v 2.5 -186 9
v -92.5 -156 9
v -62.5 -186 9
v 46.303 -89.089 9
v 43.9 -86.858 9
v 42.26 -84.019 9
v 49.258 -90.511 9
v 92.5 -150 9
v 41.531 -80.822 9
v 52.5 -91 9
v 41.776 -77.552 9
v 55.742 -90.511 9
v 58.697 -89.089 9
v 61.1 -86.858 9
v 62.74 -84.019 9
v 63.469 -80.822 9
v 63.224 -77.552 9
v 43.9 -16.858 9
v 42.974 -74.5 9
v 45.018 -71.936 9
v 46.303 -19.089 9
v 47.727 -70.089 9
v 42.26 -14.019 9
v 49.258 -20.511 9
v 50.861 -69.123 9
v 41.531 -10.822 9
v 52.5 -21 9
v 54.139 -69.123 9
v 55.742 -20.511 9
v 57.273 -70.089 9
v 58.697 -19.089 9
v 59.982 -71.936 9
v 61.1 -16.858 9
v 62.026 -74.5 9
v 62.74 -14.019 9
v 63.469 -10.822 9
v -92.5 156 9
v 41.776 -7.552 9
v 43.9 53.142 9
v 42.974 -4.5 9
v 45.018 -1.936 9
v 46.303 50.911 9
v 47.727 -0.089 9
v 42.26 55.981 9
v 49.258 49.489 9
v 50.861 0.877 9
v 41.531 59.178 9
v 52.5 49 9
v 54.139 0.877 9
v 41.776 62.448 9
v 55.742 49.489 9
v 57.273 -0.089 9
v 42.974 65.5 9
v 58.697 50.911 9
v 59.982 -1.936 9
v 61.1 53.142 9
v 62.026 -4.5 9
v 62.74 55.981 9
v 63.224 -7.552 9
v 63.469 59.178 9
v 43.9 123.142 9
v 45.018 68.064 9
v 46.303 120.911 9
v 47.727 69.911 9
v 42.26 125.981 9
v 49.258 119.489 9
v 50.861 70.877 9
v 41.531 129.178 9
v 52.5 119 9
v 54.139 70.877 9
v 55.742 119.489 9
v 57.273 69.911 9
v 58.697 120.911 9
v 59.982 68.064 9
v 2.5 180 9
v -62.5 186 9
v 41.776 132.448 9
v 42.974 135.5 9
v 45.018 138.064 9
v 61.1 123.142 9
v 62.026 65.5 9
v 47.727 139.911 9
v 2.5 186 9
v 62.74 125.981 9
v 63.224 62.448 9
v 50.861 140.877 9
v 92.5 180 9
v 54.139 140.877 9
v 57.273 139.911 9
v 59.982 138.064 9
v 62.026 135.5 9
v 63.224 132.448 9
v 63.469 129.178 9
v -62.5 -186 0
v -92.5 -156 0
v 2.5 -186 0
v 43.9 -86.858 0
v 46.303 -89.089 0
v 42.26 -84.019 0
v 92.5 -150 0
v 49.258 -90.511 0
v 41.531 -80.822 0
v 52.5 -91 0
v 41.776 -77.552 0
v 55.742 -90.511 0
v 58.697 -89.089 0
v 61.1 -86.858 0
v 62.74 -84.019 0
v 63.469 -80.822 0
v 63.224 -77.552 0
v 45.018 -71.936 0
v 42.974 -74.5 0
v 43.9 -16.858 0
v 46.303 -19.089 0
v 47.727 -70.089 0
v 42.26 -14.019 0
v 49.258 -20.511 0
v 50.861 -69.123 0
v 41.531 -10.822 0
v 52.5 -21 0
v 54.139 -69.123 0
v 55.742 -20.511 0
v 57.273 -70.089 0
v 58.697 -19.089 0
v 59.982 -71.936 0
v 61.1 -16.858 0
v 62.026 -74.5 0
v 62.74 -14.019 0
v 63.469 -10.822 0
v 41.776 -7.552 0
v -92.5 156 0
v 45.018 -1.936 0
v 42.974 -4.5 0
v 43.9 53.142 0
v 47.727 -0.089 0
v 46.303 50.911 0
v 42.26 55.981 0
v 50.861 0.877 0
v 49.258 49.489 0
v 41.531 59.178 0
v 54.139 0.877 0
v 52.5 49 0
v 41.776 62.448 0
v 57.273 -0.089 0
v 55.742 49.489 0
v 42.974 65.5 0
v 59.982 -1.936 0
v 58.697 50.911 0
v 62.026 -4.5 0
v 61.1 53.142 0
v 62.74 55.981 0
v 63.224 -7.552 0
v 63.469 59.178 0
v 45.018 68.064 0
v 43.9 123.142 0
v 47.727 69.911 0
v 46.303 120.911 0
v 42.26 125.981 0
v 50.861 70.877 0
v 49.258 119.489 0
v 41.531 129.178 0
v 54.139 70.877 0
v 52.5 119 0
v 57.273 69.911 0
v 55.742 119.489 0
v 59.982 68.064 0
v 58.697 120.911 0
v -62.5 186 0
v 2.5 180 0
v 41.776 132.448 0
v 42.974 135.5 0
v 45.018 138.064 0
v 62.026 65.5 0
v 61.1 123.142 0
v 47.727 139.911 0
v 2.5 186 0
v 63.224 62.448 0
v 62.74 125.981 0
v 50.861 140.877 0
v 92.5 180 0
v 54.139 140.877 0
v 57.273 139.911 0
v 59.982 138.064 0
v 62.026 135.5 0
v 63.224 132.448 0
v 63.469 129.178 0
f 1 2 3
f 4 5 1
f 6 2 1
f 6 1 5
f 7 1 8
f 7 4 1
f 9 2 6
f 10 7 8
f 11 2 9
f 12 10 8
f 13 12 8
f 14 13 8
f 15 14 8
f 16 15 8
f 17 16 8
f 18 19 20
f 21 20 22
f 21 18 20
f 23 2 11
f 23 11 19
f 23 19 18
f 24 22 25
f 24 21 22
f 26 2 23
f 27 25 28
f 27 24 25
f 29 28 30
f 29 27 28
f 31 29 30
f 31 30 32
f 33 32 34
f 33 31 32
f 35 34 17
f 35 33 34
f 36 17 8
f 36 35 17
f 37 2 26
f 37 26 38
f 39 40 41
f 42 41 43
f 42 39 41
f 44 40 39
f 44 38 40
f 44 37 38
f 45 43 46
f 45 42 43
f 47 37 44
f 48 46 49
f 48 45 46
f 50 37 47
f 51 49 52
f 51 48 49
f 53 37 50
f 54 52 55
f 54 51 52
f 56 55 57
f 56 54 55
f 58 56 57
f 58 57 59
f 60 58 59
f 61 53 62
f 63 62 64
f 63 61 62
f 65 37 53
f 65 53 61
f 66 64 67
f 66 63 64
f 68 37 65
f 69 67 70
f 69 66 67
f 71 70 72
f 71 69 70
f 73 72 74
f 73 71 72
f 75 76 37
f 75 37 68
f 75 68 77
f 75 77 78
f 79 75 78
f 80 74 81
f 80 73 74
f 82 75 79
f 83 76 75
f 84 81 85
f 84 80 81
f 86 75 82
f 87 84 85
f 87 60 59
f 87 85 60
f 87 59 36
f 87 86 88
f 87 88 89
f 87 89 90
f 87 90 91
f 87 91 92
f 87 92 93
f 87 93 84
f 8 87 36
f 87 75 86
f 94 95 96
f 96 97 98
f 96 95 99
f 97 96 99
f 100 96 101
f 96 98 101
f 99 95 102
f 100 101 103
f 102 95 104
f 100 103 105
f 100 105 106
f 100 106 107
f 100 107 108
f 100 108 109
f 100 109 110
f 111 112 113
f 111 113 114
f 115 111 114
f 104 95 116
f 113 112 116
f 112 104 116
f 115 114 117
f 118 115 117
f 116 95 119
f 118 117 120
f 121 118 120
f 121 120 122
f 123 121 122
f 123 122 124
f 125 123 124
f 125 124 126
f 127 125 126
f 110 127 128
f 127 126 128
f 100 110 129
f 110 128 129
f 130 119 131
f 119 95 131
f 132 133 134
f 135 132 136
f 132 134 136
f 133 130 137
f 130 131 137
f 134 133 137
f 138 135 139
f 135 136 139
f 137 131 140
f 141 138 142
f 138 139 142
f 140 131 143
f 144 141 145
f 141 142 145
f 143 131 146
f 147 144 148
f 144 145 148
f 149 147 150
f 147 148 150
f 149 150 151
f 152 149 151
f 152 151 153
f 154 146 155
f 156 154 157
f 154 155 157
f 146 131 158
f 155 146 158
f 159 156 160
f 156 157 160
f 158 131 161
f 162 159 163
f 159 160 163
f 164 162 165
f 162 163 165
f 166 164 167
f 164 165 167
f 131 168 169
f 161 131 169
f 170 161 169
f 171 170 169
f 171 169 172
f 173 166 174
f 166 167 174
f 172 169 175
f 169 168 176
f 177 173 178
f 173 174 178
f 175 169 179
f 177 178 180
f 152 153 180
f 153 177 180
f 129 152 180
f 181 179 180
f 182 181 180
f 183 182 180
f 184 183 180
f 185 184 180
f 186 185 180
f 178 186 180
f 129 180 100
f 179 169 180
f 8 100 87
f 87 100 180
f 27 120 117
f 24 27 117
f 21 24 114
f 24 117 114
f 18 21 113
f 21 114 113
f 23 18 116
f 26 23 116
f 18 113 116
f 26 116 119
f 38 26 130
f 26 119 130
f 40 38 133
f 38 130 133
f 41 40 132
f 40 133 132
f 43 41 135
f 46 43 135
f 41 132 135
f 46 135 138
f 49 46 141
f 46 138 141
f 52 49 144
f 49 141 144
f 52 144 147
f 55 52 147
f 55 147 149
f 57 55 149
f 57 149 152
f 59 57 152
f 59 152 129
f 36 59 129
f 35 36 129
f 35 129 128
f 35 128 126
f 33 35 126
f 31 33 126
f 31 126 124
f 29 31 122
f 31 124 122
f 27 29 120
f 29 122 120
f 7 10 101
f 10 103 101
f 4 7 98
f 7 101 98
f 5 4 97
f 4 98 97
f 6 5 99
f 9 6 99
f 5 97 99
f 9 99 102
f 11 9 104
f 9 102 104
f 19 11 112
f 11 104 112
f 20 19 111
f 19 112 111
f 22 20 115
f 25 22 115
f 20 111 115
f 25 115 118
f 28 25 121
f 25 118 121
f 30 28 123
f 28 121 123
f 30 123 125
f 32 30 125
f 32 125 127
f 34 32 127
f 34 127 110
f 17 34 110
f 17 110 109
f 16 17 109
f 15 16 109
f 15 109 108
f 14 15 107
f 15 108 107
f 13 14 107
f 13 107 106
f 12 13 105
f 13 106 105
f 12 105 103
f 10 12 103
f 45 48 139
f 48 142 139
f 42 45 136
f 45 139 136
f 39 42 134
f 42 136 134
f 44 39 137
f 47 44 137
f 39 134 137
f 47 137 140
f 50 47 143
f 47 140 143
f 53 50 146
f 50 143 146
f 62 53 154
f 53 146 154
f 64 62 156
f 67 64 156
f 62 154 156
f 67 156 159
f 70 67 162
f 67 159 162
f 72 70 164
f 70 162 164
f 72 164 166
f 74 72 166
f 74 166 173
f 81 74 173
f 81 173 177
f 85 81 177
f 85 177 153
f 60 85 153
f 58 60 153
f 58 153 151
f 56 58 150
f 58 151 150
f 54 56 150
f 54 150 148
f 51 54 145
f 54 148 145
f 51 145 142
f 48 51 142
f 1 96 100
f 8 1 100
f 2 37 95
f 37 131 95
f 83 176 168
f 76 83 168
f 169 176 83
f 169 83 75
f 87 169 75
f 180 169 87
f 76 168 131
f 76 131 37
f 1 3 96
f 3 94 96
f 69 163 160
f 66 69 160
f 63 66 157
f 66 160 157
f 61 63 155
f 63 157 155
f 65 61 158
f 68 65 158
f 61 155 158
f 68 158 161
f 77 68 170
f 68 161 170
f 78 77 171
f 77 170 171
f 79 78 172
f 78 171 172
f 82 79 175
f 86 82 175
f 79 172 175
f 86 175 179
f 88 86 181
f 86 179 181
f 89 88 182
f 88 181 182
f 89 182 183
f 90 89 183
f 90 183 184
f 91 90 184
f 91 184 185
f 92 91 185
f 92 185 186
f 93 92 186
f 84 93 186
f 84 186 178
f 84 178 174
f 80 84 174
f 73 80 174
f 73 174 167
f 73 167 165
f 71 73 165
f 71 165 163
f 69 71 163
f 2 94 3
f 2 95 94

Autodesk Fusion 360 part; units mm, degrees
sketch "スケッチ1" plane through (0, 0, 0) normal (0, 0, 1) x (1, 0, 0)
  line L0 (2.5, 186) -> (-92.5, 186)
  line L1 (-92.5, 186) -> (-92.5, -186)
  line L2 (-92.5, -186) -> (2.5, -186)
  line L3 (92.5, -150) -> (92.5, 180)
  line L4 (89.5161, 180) -> (-92.5, -186) construction
  line L5 (-92.5, 186) -> (77.5673, -155.9731) construction
  line L6 (2.5, 186) -> (2.5, 180)
  line L7 (2.5, 180) -> (92.5, 180)
  line L8 (-92.5, -186) -> (2.5, -186) construction
  line L9 (2.5, -186) -> (92.5, -150)
  dimension "d2" = 372
  dimension "d5" = 95
extrude "押し出し1" add sketch "スケッチ1" along normal blind 9
chamfer "面取り1" distance 30 angle 45 2 edges at (-92.5, -186, 4.5) (-92.5, 186, 4.5)
sketch "スケッチ2" plane through (0, 0, 9) normal (0, 0, 1) x (-1, 0, 0)
  line L0 (62.5, -186) -> (92.5, -156)
  line L1 (92.5, -156) -> (92.5, 156)
  line L2 (92.5, 156) -> (62.5, 186)
  line L3 (62.5, 186) -> (-2.5, 186)
  line L4 (-2.5, 186) -> (-92.5, 150)
  line L5 (-92.5, 150) -> (-92.5, -180)
  line L6 (-92.5, -180) -> (-2.5, -180)
  line L7 (-2.5, -180) -> (-2.5, -186)
  line L8 (-2.5, -186) -> (62.5, -186)
  line L9 (-92.5, -180) -> (-52.5, -180) construction
  line L10 (-52.5, -180) -> (-52.5, -130) construction
  line L11 (-52.5, -130) -> (-92.5, -130) construction
  line L12 (-92.5, -130) -> (-92.5, -180) construction
  line L13 (-52.5, -130) -> (-52.5, -60) construction
  line L14 (-52.5, -60) -> (-52.5, 10) construction
  line L15 (-52.5, 10) -> (-52.5, 80) construction
  point P0 (-52.5, -130)
  point P1 (-52.5, -60)
  point P2 (-52.5, 10)
  point P3 (-52.5, 80)
  dimension "d10" = 40
  dimension "d11" = 50
  dimension "d12" = 70
  dimension "d13" = 70
  dimension "d14" = 70
hole "穴1" at (52.5, 130, 9) at (52.5, 60, 9) at (52.5, -10, 9) at (52.5, -80, 9) direction (0, 0, -1) diameter 22 end through all
equation "d5 = 30 mm + 65 mm"
